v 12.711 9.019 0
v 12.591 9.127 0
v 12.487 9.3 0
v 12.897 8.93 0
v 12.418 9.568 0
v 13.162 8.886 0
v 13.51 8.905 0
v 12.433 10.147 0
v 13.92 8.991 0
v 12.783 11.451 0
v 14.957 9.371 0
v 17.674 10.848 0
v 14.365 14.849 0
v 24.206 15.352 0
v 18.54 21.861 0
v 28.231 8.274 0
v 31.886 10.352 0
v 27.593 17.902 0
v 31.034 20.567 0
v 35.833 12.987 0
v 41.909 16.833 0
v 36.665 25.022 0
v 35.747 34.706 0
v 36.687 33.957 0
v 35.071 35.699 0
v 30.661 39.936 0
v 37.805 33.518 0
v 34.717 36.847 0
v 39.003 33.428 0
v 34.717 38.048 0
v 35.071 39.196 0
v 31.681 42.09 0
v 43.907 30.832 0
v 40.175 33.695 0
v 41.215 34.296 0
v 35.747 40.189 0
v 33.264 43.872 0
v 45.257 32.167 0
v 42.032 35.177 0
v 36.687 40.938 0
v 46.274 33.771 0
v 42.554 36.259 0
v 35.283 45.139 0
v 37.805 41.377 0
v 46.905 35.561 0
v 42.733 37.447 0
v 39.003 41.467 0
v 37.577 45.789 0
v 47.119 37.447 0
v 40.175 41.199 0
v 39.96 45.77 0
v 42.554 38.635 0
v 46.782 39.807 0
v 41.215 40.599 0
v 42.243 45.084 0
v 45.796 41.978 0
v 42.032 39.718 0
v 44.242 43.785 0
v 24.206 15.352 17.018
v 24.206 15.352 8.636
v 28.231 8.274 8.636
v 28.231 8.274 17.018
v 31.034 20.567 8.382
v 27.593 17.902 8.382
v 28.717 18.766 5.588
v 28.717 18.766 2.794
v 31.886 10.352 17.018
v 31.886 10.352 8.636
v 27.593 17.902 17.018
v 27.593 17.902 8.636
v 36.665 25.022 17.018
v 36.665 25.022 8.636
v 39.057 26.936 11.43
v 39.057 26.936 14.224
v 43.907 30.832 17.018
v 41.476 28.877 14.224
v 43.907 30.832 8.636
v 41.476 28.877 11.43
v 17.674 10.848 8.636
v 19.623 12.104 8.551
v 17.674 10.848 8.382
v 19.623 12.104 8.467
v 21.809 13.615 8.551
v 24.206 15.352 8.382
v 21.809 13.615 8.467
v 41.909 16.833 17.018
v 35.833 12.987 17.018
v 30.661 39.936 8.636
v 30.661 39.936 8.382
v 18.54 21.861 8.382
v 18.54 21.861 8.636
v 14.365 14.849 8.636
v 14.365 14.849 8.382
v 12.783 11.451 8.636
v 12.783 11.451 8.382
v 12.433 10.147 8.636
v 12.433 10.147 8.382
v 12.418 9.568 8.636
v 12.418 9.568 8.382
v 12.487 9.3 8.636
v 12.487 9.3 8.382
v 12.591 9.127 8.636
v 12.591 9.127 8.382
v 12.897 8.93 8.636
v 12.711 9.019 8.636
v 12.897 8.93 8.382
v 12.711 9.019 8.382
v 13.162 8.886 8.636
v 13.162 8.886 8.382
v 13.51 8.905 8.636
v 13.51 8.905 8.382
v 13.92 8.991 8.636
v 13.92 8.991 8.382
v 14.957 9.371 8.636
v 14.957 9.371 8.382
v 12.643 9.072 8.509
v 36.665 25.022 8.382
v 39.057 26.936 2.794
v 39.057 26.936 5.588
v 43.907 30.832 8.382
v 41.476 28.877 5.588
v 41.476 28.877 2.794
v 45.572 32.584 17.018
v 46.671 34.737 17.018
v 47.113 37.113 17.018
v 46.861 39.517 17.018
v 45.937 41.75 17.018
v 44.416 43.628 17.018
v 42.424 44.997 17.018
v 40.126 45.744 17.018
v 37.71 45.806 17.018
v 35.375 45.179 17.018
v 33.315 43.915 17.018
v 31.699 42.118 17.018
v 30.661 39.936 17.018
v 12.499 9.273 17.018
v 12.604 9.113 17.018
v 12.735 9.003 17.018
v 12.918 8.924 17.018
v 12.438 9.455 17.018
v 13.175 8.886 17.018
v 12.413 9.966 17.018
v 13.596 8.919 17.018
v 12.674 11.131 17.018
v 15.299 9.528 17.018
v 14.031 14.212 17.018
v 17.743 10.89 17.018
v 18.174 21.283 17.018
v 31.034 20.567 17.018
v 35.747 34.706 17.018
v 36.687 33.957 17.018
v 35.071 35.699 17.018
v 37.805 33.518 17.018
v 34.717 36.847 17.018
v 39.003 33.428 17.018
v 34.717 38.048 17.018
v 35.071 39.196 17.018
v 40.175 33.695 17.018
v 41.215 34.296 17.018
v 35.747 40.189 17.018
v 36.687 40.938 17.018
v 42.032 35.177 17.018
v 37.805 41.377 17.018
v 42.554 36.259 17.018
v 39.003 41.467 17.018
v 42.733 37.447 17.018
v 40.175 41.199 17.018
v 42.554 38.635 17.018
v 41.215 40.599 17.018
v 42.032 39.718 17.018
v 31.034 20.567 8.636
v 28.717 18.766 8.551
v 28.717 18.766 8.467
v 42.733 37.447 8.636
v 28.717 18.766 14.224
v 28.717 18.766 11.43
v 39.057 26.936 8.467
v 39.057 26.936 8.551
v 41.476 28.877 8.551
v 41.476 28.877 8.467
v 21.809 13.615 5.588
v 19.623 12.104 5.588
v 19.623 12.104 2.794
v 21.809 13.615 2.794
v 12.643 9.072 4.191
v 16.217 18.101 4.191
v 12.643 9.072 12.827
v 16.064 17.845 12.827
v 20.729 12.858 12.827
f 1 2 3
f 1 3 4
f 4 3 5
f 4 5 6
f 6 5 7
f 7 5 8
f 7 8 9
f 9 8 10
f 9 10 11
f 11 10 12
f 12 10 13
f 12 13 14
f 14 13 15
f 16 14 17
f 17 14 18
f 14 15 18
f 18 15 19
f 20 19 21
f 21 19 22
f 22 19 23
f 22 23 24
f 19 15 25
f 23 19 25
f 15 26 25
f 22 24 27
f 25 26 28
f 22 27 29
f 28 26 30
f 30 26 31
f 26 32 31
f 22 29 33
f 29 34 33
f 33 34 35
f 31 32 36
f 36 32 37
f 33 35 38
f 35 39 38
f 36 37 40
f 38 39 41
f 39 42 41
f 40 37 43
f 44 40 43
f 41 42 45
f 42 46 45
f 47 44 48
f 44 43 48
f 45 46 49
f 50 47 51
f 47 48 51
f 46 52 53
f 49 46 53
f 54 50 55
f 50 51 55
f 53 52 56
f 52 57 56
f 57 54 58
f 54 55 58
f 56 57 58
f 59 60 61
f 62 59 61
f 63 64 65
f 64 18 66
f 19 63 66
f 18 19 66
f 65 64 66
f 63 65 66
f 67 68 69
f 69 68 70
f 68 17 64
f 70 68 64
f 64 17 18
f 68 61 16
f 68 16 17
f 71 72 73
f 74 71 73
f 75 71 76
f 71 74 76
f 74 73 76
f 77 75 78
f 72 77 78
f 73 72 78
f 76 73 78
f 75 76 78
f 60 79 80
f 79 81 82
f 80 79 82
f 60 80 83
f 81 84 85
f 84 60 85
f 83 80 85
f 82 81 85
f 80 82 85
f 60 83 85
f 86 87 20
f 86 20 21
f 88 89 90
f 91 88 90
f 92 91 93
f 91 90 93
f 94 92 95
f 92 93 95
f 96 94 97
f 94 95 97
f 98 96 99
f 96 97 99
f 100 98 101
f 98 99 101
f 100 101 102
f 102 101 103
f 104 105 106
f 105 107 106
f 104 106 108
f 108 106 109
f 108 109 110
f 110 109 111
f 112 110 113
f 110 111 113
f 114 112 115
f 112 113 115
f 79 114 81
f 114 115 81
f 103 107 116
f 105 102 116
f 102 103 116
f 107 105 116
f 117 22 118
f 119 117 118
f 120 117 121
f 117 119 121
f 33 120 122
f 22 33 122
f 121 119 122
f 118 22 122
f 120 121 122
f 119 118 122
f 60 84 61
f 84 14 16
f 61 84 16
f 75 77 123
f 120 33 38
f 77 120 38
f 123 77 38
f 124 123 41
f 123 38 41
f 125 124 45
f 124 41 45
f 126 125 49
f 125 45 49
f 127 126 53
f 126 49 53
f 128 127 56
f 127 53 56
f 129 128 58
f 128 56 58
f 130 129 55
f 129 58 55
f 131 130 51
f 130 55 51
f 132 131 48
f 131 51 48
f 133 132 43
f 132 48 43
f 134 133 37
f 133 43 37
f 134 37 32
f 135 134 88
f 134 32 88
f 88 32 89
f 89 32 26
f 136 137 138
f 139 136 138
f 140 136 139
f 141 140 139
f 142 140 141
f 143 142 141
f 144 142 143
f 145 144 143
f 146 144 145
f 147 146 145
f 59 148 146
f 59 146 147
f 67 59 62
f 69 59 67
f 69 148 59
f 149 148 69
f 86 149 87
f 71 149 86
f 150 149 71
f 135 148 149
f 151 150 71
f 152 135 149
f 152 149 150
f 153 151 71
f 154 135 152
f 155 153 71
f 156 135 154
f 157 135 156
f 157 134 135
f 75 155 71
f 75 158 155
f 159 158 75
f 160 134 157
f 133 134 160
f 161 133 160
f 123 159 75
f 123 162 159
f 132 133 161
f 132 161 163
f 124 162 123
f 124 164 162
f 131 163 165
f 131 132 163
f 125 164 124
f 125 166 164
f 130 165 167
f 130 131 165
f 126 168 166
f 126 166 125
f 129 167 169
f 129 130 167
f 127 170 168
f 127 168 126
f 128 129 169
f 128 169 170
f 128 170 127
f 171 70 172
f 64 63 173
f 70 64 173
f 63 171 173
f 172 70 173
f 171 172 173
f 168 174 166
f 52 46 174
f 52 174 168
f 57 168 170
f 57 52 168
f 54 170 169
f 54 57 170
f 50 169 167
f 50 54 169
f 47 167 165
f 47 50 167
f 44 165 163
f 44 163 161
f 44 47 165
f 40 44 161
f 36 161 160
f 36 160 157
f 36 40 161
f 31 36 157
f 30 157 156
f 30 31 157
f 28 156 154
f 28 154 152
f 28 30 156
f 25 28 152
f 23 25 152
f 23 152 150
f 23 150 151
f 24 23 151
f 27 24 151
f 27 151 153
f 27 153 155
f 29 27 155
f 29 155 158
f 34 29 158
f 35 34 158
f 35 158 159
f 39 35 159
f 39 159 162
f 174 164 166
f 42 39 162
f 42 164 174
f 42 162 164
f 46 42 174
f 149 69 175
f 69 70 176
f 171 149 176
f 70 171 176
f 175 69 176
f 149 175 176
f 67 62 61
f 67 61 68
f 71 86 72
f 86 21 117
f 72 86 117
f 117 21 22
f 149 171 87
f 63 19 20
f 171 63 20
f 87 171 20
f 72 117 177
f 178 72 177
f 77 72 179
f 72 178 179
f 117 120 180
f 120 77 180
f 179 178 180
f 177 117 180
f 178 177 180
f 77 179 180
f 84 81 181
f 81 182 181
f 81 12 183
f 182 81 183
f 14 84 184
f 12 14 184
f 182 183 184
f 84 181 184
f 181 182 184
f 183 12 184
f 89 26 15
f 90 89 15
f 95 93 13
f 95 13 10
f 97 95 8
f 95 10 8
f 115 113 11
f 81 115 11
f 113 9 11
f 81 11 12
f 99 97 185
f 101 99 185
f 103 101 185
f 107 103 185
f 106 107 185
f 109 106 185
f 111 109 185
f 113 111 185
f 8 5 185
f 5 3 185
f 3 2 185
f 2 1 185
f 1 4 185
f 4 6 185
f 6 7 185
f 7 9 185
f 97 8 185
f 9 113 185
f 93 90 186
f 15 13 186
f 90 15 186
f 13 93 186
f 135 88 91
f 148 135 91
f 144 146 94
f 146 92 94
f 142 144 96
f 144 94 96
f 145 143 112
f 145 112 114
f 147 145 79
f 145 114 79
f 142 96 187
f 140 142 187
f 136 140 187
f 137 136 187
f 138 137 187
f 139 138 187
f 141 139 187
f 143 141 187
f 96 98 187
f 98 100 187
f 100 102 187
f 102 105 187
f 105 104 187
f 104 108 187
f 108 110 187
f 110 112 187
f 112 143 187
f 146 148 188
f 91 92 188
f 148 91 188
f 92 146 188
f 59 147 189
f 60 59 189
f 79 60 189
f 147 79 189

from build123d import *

# Parameters (mm, degrees)
F0_R      = 4.0305419328
F1_DEPTH  = 3.302
F0_W      = 6.9032675428
F0_H      = 3.0255816225
F2_DEPTH  = 8.382
F3_DEPTH  = 8.636
F3_FACE_R = 4.0305419328
F4_DEPTH  = 8.382


with BuildPart() as f1:
    # F0 (on Top) → F1 (new body)
    with BuildSketch(Plane.XY):
        with BuildLine():
            ThreePointArc((43.9072279078, 30.8323236787), (46.2739427937, 33.7705117874), (47.119469779, 37.4473817647))
            ThreePointArc((47.119469779, 37.4473817647), (39.9604583774, 45.7701922395), (30.6609147446, 39.9358879389))
            ThreePointArc((30.6609147446, 39.9358879389), (33.9345249364, 30.5102850539), (43.9072279078, 30.8323236787))
        make_face()
        with Locations((38.7020632625, 37.4473817647)):
            Circle(F0_R, mode=Mode.SUBTRACT)
    extrude(amount=F1_DEPTH)

    # F0 (on Top) → F2 (join)
    with BuildSketch(Plane.XY):
        with BuildLine():
            ThreePointArc((43.9072279078, 30.8323236787), (33.9345249364, 30.5102850539), (30.6609147446, 39.9358879389))
            add(Edge.make_bspline(
                [(30.6609147446, 39.9358879389), (20.6893909727, 25.39170121), (7.5725286082, 6.2288638322), (15.0488049768, 9.2359109291), (17.6743862153, 10.8483482297)],
                knots=[0, 0, 0, 0, 0.4920294796, 0.647919761, 0.647919761, 0.647919761, 0.647919761], degree=3))
            add(Edge.make_bspline(
                [(17.6743862153, 10.8483482297), (19.4947029558, 11.9662517888), (21.7124243986, 13.5114372855), (24.2058042392, 15.3524549365)],
                knots=[0.647919761, 0.647919761, 0.647919761, 0.647919761, 0.7559985684, 0.7559985684, 0.7559985684, 0.7559985684], degree=3))
            add(Edge.make_bspline(
                [(24.2058042392, 15.3524549365), (25.2862932119, 16.1502472496), (26.4185470415, 17.0035927737), (27.5926585156, 17.9017946674)],
                knots=[0.7559985684, 0.7559985684, 0.7559985684, 0.7559985684, 0.8028337748, 0.8028337748, 0.8028337748, 0.8028337748], degree=3))
            add(Edge.make_bspline(
                [(27.5926585156, 17.9017946674), (28.7051086684, 18.7528253029), (29.8551354005, 19.6441245426), (31.0343118638, 20.5665938982)],
                knots=[0.8028337748, 0.8028337748, 0.8028337748, 0.8028337748, 0.8472093164, 0.8472093164, 0.8472093164, 0.8472093164], degree=3))
            add(Edge.make_bspline(
                [(31.0343118638, 20.5665938982), (32.852075568, 21.9886298403), (34.7391103278, 23.4847380549), (36.6645458304, 25.0215877893)],
                knots=[0.8472093164, 0.8472093164, 0.8472093164, 0.8472093164, 0.9156165916, 0.9156165916, 0.9156165916, 0.9156165916], degree=3))
            add(Edge.make_bspline(
                [(36.6645458304, 25.0215877893), (39.0396559305, 26.9173601078), (41.4731978173, 28.8751260137), (43.9072279078, 30.8323236787)],
                knots=[0.9156165916, 0.9156165916, 0.9156165916, 0.9156165916, 1, 1, 1, 1], degree=3))
        make_face()
        with Locations((24.1410247442, 19.4145854787)):
            Rectangle(F0_W, F0_H, mode=Mode.SUBTRACT)
        with BuildLine():
            ThreePointArc((43.9072279078, 30.8323236787), (46.2739427937, 33.7705117874), (47.119469779, 37.4473817647))
            ThreePointArc((47.119469779, 37.4473817647), (39.9604583774, 45.7701922395), (30.6609147446, 39.9358879389))
            ThreePointArc((30.6609147446, 39.9358879389), (33.9345249364, 30.5102850539), (43.9072279078, 30.8323236787))
        make_face()
        with Locations((38.7020632625, 37.4473817647)):
            Circle(F0_R, mode=Mode.SUBTRACT)
        with BuildLine():
            Line((41.9089498552, 16.8331647905), (36.6645458304, 25.0215877893))
            add(Edge.make_bspline(
                [(31.0343118638, 20.5665938982), (32.852075568, 21.9886298403), (34.7391103278, 23.4847380549), (36.6645458304, 25.0215877893)],
                knots=[0.8472093164, 0.8472093164, 0.8472093164, 0.8472093164, 0.9156165916, 0.9156165916, 0.9156165916, 0.9156165916], degree=3))
            Line((31.0343118638, 20.5665938982), (35.8326518562, 12.986669483))
            Line((35.8326518562, 12.986669483), (41.9089498552, 16.8331647905))
        make_face()
        with BuildLine():
            add(Edge.make_bspline(
                [(24.2058042392, 15.3524549365), (25.2862932119, 16.1502472496), (26.4185470415, 17.0035927737), (27.5926585156, 17.9017946674)],
                knots=[0.7559985684, 0.7559985684, 0.7559985684, 0.7559985684, 0.8028337748, 0.8028337748, 0.8028337748, 0.8028337748], degree=3))
            Line((24.2058042392, 15.3524549365), (28.2309433092, 8.273783253))
            Line((28.2309433092, 8.273783253), (31.8857005226, 10.3519847446))
            Line((31.8857005226, 10.3519847446), (27.5926585156, 17.9017946674))
        make_face()
        with Locations((24.1410247442, 19.4145854787)):
            Rectangle(F0_W, F0_H)
    extrude(amount=F2_DEPTH)

    # F0 (on Top) → F3 (join)
    with BuildSketch(Plane.XY):
        with BuildLine():
            ThreePointArc((43.9072279078, 30.8323236787), (33.9345249364, 30.5102850539), (30.6609147446, 39.9358879389))
            add(Edge.make_bspline(
                [(30.6609147446, 39.9358879389), (20.6893909727, 25.39170121), (7.5725286082, 6.2288638322), (15.0488049768, 9.2359109291), (17.6743862153, 10.8483482297)],
                knots=[0, 0, 0, 0, 0.4920294796, 0.647919761, 0.647919761, 0.647919761, 0.647919761], degree=3))
            add(Edge.make_bspline(
                [(17.6743862153, 10.8483482297), (19.4947029558, 11.9662517888), (21.7124243986, 13.5114372855), (24.2058042392, 15.3524549365)],
                knots=[0.647919761, 0.647919761, 0.647919761, 0.647919761, 0.7559985684, 0.7559985684, 0.7559985684, 0.7559985684], degree=3))
            add(Edge.make_bspline(
                [(24.2058042392, 15.3524549365), (25.2862932119, 16.1502472496), (26.4185470415, 17.0035927737), (27.5926585156, 17.9017946674)],
                knots=[0.7559985684, 0.7559985684, 0.7559985684, 0.7559985684, 0.8028337748, 0.8028337748, 0.8028337748, 0.8028337748], degree=3))
            add(Edge.make_bspline(
                [(27.5926585156, 17.9017946674), (28.7051086684, 18.7528253029), (29.8551354005, 19.6441245426), (31.0343118638, 20.5665938982)],
                knots=[0.8028337748, 0.8028337748, 0.8028337748, 0.8028337748, 0.8472093164, 0.8472093164, 0.8472093164, 0.8472093164], degree=3))
            add(Edge.make_bspline(
                [(31.0343118638, 20.5665938982), (32.852075568, 21.9886298403), (34.7391103278, 23.4847380549), (36.6645458304, 25.0215877893)],
                knots=[0.8472093164, 0.8472093164, 0.8472093164, 0.8472093164, 0.9156165916, 0.9156165916, 0.9156165916, 0.9156165916], degree=3))
            add(Edge.make_bspline(
                [(36.6645458304, 25.0215877893), (39.0396559305, 26.9173601078), (41.4731978173, 28.8751260137), (43.9072279078, 30.8323236787)],
                knots=[0.9156165916, 0.9156165916, 0.9156165916, 0.9156165916, 1, 1, 1, 1], degree=3))
        make_face()
        with Locations((24.1410247442, 19.4145854787)):
            Rectangle(F0_W, F0_H, mode=Mode.SUBTRACT)
        with BuildLine():
            ThreePointArc((43.9072279078, 30.8323236787), (46.2739427937, 33.7705117874), (47.119469779, 37.4473817647))
            ThreePointArc((47.119469779, 37.4473817647), (39.9604583774, 45.7701922395), (30.6609147446, 39.9358879389))
            ThreePointArc((30.6609147446, 39.9358879389), (33.9345249364, 30.5102850539), (43.9072279078, 30.8323236787))
        make_face()
        with Locations((38.7020632625, 37.4473817647)):
            Circle(F0_R, mode=Mode.SUBTRACT)
        with BuildLine():
            Line((41.9089498552, 16.8331647905), (36.6645458304, 25.0215877893))
            add(Edge.make_bspline(
                [(31.0343118638, 20.5665938982), (32.852075568, 21.9886298403), (34.7391103278, 23.4847380549), (36.6645458304, 25.0215877893)],
                knots=[0.8472093164, 0.8472093164, 0.8472093164, 0.8472093164, 0.9156165916, 0.9156165916, 0.9156165916, 0.9156165916], degree=3))
            Line((31.0343118638, 20.5665938982), (35.8326518562, 12.986669483))
            Line((35.8326518562, 12.986669483), (41.9089498552, 16.8331647905))
        make_face()
        with BuildLine():
            add(Edge.make_bspline(
                [(24.2058042392, 15.3524549365), (25.2862932119, 16.1502472496), (26.4185470415, 17.0035927737), (27.5926585156, 17.9017946674)],
                knots=[0.7559985684, 0.7559985684, 0.7559985684, 0.7559985684, 0.8028337748, 0.8028337748, 0.8028337748, 0.8028337748], degree=3))
            Line((24.2058042392, 15.3524549365), (28.2309433092, 8.273783253))
            Line((28.2309433092, 8.273783253), (31.8857005226, 10.3519847446))
            Line((31.8857005226, 10.3519847446), (27.5926585156, 17.9017946674))
        make_face()
        with Locations((24.1410247442, 19.4145854787)):
            Rectangle(F0_W, F0_H)
    extrude(amount=F3_DEPTH)

    # F0 (on Top) + F3_face (on face) → F4 (join)
    with BuildSketch(Plane.XY):
        with BuildLine():
            ThreePointArc((43.9072279078, 30.8323236787), (33.9345249364, 30.5102850539), (30.6609147446, 39.9358879389))
            add(Edge.make_bspline(
                [(30.6609147446, 39.9358879389), (20.6893909727, 25.39170121), (7.5725286082, 6.2288638322), (15.0488049768, 9.2359109291), (17.6743862153, 10.8483482297)],
                knots=[0, 0, 0, 0, 0.4920294796, 0.647919761, 0.647919761, 0.647919761, 0.647919761], degree=3))
            add(Edge.make_bspline(
                [(17.6743862153, 10.8483482297), (19.4947029558, 11.9662517888), (21.7124243986, 13.5114372855), (24.2058042392, 15.3524549365)],
                knots=[0.647919761, 0.647919761, 0.647919761, 0.647919761, 0.7559985684, 0.7559985684, 0.7559985684, 0.7559985684], degree=3))
            add(Edge.make_bspline(
                [(24.2058042392, 15.3524549365), (25.2862932119, 16.1502472496), (26.4185470415, 17.0035927737), (27.5926585156, 17.9017946674)],
                knots=[0.7559985684, 0.7559985684, 0.7559985684, 0.7559985684, 0.8028337748, 0.8028337748, 0.8028337748, 0.8028337748], degree=3))
            add(Edge.make_bspline(
                [(27.5926585156, 17.9017946674), (28.7051086684, 18.7528253029), (29.8551354005, 19.6441245426), (31.0343118638, 20.5665938982)],
                knots=[0.8028337748, 0.8028337748, 0.8028337748, 0.8028337748, 0.8472093164, 0.8472093164, 0.8472093164, 0.8472093164], degree=3))
            add(Edge.make_bspline(
                [(31.0343118638, 20.5665938982), (32.852075568, 21.9886298403), (34.7391103278, 23.4847380549), (36.6645458304, 25.0215877893)],
                knots=[0.8472093164, 0.8472093164, 0.8472093164, 0.8472093164, 0.9156165916, 0.9156165916, 0.9156165916, 0.9156165916], degree=3))
            add(Edge.make_bspline(
                [(36.6645458304, 25.0215877893), (39.0396559305, 26.9173601078), (41.4731978173, 28.8751260137), (43.9072279078, 30.8323236787)],
                knots=[0.9156165916, 0.9156165916, 0.9156165916, 0.9156165916, 1, 1, 1, 1], degree=3))
        make_face()
        with Locations((24.1410247442, 19.4145854787)):
            Rectangle(F0_W, F0_H, mode=Mode.SUBTRACT)
        with BuildLine():
            ThreePointArc((43.9072279078, 30.8323236787), (46.2739427937, 33.7705117874), (47.119469779, 37.4473817647))
            ThreePointArc((47.119469779, 37.4473817647), (39.9604583774, 45.7701922395), (30.6609147446, 39.9358879389))
            ThreePointArc((30.6609147446, 39.9358879389), (33.9345249364, 30.5102850539), (43.9072279078, 30.8323236787))
        make_face()
        with Locations((38.7020632625, 37.4473817647)):
            Circle(F0_R, mode=Mode.SUBTRACT)
        with BuildLine():
            Line((41.9089498552, 16.8331647905), (36.6645458304, 25.0215877893))
            add(Edge.make_bspline(
                [(31.0343118638, 20.5665938982), (32.852075568, 21.9886298403), (34.7391103278, 23.4847380549), (36.6645458304, 25.0215877893)],
                knots=[0.8472093164, 0.8472093164, 0.8472093164, 0.8472093164, 0.9156165916, 0.9156165916, 0.9156165916, 0.9156165916], degree=3))
            Line((31.0343118638, 20.5665938982), (35.8326518562, 12.986669483))
            Line((35.8326518562, 12.986669483), (41.9089498552, 16.8331647905))
        make_face()
        with BuildLine():
            add(Edge.make_bspline(
                [(24.2058042392, 15.3524549365), (25.2862932119, 16.1502472496), (26.4185470415, 17.0035927737), (27.5926585156, 17.9017946674)],
                knots=[0.7559985684, 0.7559985684, 0.7559985684, 0.7559985684, 0.8028337748, 0.8028337748, 0.8028337748, 0.8028337748], degree=3))
            Line((24.2058042392, 15.3524549365), (28.2309433092, 8.273783253))
            Line((28.2309433092, 8.273783253), (31.8857005226, 10.3519847446))
            Line((31.8857005226, 10.3519847446), (27.5926585156, 17.9017946674))
        make_face()
        with Locations((24.1410247442, 19.4145854787)):
            Rectangle(F0_W, F0_H)
    with BuildSketch(Plane(origin=(31.1212080888, 26.3654113586, 8.636), x_dir=(1, 0, 0), z_dir=(0, 0, 1))):
        with BuildLine():
            add(Edge.make_bspline(
                [(-0.4602933442, 13.5704765802), (-10.4318171161, -0.9737101486), (-25.736689364, -23.333080082), (-13.0051750128, -15.5094138089), (-6.9154038496, -11.0129564222)],
                knots=[0, 0, 0, 0, 0.4920294796, 0.7559985684, 0.7559985684, 0.7559985684, 0.7559985684], degree=3))
            Line((-6.9154038496, -11.0129564222), (-2.8902647797, -18.0916281056))
            Line((-2.8902647797, -18.0916281056), (0.7644924338, -16.013426614))
            Line((0.7644924338, -16.013426614), (-3.5285495732, -8.4636166912))
            add(Edge.make_bspline(
                [(-3.5285495732, -8.4636166912), (-2.4160994204, -7.6125860558), (-1.2660726883, -6.7212868161), (-0.086896225, -5.7988174604)],
                knots=[0.8028337748, 0.8028337748, 0.8028337748, 0.8028337748, 0.8472093164, 0.8472093164, 0.8472093164, 0.8472093164], degree=3))
            Line((-0.086896225, -5.7988174604), (4.7114437674, -13.3787418756))
            Line((4.7114437674, -13.3787418756), (10.7877417664, -9.5322465681))
            Line((10.7877417664, -9.5322465681), (5.5433377416, -1.3438235693))
            add(Edge.make_bspline(
                [(5.5433377416, -1.3438235693), (7.9184478417, 0.5519487491), (10.3519897285, 2.509714655), (12.786019819, 4.4669123201)],
                knots=[0.9156165916, 0.9156165916, 0.9156165916, 0.9156165916, 1, 1, 1, 1], degree=3))
            ThreePointArc((12.786019819, 4.4669123201), (12.3483934997, 18.0190671168), (-0.4602933442, 13.5704765802))
        make_face()
        with Locations((7.5808551736, 11.081970406)):
            Circle(F3_FACE_R, mode=Mode.SUBTRACT)
    extrude(amount=F4_DEPTH)


solid = f1.part
